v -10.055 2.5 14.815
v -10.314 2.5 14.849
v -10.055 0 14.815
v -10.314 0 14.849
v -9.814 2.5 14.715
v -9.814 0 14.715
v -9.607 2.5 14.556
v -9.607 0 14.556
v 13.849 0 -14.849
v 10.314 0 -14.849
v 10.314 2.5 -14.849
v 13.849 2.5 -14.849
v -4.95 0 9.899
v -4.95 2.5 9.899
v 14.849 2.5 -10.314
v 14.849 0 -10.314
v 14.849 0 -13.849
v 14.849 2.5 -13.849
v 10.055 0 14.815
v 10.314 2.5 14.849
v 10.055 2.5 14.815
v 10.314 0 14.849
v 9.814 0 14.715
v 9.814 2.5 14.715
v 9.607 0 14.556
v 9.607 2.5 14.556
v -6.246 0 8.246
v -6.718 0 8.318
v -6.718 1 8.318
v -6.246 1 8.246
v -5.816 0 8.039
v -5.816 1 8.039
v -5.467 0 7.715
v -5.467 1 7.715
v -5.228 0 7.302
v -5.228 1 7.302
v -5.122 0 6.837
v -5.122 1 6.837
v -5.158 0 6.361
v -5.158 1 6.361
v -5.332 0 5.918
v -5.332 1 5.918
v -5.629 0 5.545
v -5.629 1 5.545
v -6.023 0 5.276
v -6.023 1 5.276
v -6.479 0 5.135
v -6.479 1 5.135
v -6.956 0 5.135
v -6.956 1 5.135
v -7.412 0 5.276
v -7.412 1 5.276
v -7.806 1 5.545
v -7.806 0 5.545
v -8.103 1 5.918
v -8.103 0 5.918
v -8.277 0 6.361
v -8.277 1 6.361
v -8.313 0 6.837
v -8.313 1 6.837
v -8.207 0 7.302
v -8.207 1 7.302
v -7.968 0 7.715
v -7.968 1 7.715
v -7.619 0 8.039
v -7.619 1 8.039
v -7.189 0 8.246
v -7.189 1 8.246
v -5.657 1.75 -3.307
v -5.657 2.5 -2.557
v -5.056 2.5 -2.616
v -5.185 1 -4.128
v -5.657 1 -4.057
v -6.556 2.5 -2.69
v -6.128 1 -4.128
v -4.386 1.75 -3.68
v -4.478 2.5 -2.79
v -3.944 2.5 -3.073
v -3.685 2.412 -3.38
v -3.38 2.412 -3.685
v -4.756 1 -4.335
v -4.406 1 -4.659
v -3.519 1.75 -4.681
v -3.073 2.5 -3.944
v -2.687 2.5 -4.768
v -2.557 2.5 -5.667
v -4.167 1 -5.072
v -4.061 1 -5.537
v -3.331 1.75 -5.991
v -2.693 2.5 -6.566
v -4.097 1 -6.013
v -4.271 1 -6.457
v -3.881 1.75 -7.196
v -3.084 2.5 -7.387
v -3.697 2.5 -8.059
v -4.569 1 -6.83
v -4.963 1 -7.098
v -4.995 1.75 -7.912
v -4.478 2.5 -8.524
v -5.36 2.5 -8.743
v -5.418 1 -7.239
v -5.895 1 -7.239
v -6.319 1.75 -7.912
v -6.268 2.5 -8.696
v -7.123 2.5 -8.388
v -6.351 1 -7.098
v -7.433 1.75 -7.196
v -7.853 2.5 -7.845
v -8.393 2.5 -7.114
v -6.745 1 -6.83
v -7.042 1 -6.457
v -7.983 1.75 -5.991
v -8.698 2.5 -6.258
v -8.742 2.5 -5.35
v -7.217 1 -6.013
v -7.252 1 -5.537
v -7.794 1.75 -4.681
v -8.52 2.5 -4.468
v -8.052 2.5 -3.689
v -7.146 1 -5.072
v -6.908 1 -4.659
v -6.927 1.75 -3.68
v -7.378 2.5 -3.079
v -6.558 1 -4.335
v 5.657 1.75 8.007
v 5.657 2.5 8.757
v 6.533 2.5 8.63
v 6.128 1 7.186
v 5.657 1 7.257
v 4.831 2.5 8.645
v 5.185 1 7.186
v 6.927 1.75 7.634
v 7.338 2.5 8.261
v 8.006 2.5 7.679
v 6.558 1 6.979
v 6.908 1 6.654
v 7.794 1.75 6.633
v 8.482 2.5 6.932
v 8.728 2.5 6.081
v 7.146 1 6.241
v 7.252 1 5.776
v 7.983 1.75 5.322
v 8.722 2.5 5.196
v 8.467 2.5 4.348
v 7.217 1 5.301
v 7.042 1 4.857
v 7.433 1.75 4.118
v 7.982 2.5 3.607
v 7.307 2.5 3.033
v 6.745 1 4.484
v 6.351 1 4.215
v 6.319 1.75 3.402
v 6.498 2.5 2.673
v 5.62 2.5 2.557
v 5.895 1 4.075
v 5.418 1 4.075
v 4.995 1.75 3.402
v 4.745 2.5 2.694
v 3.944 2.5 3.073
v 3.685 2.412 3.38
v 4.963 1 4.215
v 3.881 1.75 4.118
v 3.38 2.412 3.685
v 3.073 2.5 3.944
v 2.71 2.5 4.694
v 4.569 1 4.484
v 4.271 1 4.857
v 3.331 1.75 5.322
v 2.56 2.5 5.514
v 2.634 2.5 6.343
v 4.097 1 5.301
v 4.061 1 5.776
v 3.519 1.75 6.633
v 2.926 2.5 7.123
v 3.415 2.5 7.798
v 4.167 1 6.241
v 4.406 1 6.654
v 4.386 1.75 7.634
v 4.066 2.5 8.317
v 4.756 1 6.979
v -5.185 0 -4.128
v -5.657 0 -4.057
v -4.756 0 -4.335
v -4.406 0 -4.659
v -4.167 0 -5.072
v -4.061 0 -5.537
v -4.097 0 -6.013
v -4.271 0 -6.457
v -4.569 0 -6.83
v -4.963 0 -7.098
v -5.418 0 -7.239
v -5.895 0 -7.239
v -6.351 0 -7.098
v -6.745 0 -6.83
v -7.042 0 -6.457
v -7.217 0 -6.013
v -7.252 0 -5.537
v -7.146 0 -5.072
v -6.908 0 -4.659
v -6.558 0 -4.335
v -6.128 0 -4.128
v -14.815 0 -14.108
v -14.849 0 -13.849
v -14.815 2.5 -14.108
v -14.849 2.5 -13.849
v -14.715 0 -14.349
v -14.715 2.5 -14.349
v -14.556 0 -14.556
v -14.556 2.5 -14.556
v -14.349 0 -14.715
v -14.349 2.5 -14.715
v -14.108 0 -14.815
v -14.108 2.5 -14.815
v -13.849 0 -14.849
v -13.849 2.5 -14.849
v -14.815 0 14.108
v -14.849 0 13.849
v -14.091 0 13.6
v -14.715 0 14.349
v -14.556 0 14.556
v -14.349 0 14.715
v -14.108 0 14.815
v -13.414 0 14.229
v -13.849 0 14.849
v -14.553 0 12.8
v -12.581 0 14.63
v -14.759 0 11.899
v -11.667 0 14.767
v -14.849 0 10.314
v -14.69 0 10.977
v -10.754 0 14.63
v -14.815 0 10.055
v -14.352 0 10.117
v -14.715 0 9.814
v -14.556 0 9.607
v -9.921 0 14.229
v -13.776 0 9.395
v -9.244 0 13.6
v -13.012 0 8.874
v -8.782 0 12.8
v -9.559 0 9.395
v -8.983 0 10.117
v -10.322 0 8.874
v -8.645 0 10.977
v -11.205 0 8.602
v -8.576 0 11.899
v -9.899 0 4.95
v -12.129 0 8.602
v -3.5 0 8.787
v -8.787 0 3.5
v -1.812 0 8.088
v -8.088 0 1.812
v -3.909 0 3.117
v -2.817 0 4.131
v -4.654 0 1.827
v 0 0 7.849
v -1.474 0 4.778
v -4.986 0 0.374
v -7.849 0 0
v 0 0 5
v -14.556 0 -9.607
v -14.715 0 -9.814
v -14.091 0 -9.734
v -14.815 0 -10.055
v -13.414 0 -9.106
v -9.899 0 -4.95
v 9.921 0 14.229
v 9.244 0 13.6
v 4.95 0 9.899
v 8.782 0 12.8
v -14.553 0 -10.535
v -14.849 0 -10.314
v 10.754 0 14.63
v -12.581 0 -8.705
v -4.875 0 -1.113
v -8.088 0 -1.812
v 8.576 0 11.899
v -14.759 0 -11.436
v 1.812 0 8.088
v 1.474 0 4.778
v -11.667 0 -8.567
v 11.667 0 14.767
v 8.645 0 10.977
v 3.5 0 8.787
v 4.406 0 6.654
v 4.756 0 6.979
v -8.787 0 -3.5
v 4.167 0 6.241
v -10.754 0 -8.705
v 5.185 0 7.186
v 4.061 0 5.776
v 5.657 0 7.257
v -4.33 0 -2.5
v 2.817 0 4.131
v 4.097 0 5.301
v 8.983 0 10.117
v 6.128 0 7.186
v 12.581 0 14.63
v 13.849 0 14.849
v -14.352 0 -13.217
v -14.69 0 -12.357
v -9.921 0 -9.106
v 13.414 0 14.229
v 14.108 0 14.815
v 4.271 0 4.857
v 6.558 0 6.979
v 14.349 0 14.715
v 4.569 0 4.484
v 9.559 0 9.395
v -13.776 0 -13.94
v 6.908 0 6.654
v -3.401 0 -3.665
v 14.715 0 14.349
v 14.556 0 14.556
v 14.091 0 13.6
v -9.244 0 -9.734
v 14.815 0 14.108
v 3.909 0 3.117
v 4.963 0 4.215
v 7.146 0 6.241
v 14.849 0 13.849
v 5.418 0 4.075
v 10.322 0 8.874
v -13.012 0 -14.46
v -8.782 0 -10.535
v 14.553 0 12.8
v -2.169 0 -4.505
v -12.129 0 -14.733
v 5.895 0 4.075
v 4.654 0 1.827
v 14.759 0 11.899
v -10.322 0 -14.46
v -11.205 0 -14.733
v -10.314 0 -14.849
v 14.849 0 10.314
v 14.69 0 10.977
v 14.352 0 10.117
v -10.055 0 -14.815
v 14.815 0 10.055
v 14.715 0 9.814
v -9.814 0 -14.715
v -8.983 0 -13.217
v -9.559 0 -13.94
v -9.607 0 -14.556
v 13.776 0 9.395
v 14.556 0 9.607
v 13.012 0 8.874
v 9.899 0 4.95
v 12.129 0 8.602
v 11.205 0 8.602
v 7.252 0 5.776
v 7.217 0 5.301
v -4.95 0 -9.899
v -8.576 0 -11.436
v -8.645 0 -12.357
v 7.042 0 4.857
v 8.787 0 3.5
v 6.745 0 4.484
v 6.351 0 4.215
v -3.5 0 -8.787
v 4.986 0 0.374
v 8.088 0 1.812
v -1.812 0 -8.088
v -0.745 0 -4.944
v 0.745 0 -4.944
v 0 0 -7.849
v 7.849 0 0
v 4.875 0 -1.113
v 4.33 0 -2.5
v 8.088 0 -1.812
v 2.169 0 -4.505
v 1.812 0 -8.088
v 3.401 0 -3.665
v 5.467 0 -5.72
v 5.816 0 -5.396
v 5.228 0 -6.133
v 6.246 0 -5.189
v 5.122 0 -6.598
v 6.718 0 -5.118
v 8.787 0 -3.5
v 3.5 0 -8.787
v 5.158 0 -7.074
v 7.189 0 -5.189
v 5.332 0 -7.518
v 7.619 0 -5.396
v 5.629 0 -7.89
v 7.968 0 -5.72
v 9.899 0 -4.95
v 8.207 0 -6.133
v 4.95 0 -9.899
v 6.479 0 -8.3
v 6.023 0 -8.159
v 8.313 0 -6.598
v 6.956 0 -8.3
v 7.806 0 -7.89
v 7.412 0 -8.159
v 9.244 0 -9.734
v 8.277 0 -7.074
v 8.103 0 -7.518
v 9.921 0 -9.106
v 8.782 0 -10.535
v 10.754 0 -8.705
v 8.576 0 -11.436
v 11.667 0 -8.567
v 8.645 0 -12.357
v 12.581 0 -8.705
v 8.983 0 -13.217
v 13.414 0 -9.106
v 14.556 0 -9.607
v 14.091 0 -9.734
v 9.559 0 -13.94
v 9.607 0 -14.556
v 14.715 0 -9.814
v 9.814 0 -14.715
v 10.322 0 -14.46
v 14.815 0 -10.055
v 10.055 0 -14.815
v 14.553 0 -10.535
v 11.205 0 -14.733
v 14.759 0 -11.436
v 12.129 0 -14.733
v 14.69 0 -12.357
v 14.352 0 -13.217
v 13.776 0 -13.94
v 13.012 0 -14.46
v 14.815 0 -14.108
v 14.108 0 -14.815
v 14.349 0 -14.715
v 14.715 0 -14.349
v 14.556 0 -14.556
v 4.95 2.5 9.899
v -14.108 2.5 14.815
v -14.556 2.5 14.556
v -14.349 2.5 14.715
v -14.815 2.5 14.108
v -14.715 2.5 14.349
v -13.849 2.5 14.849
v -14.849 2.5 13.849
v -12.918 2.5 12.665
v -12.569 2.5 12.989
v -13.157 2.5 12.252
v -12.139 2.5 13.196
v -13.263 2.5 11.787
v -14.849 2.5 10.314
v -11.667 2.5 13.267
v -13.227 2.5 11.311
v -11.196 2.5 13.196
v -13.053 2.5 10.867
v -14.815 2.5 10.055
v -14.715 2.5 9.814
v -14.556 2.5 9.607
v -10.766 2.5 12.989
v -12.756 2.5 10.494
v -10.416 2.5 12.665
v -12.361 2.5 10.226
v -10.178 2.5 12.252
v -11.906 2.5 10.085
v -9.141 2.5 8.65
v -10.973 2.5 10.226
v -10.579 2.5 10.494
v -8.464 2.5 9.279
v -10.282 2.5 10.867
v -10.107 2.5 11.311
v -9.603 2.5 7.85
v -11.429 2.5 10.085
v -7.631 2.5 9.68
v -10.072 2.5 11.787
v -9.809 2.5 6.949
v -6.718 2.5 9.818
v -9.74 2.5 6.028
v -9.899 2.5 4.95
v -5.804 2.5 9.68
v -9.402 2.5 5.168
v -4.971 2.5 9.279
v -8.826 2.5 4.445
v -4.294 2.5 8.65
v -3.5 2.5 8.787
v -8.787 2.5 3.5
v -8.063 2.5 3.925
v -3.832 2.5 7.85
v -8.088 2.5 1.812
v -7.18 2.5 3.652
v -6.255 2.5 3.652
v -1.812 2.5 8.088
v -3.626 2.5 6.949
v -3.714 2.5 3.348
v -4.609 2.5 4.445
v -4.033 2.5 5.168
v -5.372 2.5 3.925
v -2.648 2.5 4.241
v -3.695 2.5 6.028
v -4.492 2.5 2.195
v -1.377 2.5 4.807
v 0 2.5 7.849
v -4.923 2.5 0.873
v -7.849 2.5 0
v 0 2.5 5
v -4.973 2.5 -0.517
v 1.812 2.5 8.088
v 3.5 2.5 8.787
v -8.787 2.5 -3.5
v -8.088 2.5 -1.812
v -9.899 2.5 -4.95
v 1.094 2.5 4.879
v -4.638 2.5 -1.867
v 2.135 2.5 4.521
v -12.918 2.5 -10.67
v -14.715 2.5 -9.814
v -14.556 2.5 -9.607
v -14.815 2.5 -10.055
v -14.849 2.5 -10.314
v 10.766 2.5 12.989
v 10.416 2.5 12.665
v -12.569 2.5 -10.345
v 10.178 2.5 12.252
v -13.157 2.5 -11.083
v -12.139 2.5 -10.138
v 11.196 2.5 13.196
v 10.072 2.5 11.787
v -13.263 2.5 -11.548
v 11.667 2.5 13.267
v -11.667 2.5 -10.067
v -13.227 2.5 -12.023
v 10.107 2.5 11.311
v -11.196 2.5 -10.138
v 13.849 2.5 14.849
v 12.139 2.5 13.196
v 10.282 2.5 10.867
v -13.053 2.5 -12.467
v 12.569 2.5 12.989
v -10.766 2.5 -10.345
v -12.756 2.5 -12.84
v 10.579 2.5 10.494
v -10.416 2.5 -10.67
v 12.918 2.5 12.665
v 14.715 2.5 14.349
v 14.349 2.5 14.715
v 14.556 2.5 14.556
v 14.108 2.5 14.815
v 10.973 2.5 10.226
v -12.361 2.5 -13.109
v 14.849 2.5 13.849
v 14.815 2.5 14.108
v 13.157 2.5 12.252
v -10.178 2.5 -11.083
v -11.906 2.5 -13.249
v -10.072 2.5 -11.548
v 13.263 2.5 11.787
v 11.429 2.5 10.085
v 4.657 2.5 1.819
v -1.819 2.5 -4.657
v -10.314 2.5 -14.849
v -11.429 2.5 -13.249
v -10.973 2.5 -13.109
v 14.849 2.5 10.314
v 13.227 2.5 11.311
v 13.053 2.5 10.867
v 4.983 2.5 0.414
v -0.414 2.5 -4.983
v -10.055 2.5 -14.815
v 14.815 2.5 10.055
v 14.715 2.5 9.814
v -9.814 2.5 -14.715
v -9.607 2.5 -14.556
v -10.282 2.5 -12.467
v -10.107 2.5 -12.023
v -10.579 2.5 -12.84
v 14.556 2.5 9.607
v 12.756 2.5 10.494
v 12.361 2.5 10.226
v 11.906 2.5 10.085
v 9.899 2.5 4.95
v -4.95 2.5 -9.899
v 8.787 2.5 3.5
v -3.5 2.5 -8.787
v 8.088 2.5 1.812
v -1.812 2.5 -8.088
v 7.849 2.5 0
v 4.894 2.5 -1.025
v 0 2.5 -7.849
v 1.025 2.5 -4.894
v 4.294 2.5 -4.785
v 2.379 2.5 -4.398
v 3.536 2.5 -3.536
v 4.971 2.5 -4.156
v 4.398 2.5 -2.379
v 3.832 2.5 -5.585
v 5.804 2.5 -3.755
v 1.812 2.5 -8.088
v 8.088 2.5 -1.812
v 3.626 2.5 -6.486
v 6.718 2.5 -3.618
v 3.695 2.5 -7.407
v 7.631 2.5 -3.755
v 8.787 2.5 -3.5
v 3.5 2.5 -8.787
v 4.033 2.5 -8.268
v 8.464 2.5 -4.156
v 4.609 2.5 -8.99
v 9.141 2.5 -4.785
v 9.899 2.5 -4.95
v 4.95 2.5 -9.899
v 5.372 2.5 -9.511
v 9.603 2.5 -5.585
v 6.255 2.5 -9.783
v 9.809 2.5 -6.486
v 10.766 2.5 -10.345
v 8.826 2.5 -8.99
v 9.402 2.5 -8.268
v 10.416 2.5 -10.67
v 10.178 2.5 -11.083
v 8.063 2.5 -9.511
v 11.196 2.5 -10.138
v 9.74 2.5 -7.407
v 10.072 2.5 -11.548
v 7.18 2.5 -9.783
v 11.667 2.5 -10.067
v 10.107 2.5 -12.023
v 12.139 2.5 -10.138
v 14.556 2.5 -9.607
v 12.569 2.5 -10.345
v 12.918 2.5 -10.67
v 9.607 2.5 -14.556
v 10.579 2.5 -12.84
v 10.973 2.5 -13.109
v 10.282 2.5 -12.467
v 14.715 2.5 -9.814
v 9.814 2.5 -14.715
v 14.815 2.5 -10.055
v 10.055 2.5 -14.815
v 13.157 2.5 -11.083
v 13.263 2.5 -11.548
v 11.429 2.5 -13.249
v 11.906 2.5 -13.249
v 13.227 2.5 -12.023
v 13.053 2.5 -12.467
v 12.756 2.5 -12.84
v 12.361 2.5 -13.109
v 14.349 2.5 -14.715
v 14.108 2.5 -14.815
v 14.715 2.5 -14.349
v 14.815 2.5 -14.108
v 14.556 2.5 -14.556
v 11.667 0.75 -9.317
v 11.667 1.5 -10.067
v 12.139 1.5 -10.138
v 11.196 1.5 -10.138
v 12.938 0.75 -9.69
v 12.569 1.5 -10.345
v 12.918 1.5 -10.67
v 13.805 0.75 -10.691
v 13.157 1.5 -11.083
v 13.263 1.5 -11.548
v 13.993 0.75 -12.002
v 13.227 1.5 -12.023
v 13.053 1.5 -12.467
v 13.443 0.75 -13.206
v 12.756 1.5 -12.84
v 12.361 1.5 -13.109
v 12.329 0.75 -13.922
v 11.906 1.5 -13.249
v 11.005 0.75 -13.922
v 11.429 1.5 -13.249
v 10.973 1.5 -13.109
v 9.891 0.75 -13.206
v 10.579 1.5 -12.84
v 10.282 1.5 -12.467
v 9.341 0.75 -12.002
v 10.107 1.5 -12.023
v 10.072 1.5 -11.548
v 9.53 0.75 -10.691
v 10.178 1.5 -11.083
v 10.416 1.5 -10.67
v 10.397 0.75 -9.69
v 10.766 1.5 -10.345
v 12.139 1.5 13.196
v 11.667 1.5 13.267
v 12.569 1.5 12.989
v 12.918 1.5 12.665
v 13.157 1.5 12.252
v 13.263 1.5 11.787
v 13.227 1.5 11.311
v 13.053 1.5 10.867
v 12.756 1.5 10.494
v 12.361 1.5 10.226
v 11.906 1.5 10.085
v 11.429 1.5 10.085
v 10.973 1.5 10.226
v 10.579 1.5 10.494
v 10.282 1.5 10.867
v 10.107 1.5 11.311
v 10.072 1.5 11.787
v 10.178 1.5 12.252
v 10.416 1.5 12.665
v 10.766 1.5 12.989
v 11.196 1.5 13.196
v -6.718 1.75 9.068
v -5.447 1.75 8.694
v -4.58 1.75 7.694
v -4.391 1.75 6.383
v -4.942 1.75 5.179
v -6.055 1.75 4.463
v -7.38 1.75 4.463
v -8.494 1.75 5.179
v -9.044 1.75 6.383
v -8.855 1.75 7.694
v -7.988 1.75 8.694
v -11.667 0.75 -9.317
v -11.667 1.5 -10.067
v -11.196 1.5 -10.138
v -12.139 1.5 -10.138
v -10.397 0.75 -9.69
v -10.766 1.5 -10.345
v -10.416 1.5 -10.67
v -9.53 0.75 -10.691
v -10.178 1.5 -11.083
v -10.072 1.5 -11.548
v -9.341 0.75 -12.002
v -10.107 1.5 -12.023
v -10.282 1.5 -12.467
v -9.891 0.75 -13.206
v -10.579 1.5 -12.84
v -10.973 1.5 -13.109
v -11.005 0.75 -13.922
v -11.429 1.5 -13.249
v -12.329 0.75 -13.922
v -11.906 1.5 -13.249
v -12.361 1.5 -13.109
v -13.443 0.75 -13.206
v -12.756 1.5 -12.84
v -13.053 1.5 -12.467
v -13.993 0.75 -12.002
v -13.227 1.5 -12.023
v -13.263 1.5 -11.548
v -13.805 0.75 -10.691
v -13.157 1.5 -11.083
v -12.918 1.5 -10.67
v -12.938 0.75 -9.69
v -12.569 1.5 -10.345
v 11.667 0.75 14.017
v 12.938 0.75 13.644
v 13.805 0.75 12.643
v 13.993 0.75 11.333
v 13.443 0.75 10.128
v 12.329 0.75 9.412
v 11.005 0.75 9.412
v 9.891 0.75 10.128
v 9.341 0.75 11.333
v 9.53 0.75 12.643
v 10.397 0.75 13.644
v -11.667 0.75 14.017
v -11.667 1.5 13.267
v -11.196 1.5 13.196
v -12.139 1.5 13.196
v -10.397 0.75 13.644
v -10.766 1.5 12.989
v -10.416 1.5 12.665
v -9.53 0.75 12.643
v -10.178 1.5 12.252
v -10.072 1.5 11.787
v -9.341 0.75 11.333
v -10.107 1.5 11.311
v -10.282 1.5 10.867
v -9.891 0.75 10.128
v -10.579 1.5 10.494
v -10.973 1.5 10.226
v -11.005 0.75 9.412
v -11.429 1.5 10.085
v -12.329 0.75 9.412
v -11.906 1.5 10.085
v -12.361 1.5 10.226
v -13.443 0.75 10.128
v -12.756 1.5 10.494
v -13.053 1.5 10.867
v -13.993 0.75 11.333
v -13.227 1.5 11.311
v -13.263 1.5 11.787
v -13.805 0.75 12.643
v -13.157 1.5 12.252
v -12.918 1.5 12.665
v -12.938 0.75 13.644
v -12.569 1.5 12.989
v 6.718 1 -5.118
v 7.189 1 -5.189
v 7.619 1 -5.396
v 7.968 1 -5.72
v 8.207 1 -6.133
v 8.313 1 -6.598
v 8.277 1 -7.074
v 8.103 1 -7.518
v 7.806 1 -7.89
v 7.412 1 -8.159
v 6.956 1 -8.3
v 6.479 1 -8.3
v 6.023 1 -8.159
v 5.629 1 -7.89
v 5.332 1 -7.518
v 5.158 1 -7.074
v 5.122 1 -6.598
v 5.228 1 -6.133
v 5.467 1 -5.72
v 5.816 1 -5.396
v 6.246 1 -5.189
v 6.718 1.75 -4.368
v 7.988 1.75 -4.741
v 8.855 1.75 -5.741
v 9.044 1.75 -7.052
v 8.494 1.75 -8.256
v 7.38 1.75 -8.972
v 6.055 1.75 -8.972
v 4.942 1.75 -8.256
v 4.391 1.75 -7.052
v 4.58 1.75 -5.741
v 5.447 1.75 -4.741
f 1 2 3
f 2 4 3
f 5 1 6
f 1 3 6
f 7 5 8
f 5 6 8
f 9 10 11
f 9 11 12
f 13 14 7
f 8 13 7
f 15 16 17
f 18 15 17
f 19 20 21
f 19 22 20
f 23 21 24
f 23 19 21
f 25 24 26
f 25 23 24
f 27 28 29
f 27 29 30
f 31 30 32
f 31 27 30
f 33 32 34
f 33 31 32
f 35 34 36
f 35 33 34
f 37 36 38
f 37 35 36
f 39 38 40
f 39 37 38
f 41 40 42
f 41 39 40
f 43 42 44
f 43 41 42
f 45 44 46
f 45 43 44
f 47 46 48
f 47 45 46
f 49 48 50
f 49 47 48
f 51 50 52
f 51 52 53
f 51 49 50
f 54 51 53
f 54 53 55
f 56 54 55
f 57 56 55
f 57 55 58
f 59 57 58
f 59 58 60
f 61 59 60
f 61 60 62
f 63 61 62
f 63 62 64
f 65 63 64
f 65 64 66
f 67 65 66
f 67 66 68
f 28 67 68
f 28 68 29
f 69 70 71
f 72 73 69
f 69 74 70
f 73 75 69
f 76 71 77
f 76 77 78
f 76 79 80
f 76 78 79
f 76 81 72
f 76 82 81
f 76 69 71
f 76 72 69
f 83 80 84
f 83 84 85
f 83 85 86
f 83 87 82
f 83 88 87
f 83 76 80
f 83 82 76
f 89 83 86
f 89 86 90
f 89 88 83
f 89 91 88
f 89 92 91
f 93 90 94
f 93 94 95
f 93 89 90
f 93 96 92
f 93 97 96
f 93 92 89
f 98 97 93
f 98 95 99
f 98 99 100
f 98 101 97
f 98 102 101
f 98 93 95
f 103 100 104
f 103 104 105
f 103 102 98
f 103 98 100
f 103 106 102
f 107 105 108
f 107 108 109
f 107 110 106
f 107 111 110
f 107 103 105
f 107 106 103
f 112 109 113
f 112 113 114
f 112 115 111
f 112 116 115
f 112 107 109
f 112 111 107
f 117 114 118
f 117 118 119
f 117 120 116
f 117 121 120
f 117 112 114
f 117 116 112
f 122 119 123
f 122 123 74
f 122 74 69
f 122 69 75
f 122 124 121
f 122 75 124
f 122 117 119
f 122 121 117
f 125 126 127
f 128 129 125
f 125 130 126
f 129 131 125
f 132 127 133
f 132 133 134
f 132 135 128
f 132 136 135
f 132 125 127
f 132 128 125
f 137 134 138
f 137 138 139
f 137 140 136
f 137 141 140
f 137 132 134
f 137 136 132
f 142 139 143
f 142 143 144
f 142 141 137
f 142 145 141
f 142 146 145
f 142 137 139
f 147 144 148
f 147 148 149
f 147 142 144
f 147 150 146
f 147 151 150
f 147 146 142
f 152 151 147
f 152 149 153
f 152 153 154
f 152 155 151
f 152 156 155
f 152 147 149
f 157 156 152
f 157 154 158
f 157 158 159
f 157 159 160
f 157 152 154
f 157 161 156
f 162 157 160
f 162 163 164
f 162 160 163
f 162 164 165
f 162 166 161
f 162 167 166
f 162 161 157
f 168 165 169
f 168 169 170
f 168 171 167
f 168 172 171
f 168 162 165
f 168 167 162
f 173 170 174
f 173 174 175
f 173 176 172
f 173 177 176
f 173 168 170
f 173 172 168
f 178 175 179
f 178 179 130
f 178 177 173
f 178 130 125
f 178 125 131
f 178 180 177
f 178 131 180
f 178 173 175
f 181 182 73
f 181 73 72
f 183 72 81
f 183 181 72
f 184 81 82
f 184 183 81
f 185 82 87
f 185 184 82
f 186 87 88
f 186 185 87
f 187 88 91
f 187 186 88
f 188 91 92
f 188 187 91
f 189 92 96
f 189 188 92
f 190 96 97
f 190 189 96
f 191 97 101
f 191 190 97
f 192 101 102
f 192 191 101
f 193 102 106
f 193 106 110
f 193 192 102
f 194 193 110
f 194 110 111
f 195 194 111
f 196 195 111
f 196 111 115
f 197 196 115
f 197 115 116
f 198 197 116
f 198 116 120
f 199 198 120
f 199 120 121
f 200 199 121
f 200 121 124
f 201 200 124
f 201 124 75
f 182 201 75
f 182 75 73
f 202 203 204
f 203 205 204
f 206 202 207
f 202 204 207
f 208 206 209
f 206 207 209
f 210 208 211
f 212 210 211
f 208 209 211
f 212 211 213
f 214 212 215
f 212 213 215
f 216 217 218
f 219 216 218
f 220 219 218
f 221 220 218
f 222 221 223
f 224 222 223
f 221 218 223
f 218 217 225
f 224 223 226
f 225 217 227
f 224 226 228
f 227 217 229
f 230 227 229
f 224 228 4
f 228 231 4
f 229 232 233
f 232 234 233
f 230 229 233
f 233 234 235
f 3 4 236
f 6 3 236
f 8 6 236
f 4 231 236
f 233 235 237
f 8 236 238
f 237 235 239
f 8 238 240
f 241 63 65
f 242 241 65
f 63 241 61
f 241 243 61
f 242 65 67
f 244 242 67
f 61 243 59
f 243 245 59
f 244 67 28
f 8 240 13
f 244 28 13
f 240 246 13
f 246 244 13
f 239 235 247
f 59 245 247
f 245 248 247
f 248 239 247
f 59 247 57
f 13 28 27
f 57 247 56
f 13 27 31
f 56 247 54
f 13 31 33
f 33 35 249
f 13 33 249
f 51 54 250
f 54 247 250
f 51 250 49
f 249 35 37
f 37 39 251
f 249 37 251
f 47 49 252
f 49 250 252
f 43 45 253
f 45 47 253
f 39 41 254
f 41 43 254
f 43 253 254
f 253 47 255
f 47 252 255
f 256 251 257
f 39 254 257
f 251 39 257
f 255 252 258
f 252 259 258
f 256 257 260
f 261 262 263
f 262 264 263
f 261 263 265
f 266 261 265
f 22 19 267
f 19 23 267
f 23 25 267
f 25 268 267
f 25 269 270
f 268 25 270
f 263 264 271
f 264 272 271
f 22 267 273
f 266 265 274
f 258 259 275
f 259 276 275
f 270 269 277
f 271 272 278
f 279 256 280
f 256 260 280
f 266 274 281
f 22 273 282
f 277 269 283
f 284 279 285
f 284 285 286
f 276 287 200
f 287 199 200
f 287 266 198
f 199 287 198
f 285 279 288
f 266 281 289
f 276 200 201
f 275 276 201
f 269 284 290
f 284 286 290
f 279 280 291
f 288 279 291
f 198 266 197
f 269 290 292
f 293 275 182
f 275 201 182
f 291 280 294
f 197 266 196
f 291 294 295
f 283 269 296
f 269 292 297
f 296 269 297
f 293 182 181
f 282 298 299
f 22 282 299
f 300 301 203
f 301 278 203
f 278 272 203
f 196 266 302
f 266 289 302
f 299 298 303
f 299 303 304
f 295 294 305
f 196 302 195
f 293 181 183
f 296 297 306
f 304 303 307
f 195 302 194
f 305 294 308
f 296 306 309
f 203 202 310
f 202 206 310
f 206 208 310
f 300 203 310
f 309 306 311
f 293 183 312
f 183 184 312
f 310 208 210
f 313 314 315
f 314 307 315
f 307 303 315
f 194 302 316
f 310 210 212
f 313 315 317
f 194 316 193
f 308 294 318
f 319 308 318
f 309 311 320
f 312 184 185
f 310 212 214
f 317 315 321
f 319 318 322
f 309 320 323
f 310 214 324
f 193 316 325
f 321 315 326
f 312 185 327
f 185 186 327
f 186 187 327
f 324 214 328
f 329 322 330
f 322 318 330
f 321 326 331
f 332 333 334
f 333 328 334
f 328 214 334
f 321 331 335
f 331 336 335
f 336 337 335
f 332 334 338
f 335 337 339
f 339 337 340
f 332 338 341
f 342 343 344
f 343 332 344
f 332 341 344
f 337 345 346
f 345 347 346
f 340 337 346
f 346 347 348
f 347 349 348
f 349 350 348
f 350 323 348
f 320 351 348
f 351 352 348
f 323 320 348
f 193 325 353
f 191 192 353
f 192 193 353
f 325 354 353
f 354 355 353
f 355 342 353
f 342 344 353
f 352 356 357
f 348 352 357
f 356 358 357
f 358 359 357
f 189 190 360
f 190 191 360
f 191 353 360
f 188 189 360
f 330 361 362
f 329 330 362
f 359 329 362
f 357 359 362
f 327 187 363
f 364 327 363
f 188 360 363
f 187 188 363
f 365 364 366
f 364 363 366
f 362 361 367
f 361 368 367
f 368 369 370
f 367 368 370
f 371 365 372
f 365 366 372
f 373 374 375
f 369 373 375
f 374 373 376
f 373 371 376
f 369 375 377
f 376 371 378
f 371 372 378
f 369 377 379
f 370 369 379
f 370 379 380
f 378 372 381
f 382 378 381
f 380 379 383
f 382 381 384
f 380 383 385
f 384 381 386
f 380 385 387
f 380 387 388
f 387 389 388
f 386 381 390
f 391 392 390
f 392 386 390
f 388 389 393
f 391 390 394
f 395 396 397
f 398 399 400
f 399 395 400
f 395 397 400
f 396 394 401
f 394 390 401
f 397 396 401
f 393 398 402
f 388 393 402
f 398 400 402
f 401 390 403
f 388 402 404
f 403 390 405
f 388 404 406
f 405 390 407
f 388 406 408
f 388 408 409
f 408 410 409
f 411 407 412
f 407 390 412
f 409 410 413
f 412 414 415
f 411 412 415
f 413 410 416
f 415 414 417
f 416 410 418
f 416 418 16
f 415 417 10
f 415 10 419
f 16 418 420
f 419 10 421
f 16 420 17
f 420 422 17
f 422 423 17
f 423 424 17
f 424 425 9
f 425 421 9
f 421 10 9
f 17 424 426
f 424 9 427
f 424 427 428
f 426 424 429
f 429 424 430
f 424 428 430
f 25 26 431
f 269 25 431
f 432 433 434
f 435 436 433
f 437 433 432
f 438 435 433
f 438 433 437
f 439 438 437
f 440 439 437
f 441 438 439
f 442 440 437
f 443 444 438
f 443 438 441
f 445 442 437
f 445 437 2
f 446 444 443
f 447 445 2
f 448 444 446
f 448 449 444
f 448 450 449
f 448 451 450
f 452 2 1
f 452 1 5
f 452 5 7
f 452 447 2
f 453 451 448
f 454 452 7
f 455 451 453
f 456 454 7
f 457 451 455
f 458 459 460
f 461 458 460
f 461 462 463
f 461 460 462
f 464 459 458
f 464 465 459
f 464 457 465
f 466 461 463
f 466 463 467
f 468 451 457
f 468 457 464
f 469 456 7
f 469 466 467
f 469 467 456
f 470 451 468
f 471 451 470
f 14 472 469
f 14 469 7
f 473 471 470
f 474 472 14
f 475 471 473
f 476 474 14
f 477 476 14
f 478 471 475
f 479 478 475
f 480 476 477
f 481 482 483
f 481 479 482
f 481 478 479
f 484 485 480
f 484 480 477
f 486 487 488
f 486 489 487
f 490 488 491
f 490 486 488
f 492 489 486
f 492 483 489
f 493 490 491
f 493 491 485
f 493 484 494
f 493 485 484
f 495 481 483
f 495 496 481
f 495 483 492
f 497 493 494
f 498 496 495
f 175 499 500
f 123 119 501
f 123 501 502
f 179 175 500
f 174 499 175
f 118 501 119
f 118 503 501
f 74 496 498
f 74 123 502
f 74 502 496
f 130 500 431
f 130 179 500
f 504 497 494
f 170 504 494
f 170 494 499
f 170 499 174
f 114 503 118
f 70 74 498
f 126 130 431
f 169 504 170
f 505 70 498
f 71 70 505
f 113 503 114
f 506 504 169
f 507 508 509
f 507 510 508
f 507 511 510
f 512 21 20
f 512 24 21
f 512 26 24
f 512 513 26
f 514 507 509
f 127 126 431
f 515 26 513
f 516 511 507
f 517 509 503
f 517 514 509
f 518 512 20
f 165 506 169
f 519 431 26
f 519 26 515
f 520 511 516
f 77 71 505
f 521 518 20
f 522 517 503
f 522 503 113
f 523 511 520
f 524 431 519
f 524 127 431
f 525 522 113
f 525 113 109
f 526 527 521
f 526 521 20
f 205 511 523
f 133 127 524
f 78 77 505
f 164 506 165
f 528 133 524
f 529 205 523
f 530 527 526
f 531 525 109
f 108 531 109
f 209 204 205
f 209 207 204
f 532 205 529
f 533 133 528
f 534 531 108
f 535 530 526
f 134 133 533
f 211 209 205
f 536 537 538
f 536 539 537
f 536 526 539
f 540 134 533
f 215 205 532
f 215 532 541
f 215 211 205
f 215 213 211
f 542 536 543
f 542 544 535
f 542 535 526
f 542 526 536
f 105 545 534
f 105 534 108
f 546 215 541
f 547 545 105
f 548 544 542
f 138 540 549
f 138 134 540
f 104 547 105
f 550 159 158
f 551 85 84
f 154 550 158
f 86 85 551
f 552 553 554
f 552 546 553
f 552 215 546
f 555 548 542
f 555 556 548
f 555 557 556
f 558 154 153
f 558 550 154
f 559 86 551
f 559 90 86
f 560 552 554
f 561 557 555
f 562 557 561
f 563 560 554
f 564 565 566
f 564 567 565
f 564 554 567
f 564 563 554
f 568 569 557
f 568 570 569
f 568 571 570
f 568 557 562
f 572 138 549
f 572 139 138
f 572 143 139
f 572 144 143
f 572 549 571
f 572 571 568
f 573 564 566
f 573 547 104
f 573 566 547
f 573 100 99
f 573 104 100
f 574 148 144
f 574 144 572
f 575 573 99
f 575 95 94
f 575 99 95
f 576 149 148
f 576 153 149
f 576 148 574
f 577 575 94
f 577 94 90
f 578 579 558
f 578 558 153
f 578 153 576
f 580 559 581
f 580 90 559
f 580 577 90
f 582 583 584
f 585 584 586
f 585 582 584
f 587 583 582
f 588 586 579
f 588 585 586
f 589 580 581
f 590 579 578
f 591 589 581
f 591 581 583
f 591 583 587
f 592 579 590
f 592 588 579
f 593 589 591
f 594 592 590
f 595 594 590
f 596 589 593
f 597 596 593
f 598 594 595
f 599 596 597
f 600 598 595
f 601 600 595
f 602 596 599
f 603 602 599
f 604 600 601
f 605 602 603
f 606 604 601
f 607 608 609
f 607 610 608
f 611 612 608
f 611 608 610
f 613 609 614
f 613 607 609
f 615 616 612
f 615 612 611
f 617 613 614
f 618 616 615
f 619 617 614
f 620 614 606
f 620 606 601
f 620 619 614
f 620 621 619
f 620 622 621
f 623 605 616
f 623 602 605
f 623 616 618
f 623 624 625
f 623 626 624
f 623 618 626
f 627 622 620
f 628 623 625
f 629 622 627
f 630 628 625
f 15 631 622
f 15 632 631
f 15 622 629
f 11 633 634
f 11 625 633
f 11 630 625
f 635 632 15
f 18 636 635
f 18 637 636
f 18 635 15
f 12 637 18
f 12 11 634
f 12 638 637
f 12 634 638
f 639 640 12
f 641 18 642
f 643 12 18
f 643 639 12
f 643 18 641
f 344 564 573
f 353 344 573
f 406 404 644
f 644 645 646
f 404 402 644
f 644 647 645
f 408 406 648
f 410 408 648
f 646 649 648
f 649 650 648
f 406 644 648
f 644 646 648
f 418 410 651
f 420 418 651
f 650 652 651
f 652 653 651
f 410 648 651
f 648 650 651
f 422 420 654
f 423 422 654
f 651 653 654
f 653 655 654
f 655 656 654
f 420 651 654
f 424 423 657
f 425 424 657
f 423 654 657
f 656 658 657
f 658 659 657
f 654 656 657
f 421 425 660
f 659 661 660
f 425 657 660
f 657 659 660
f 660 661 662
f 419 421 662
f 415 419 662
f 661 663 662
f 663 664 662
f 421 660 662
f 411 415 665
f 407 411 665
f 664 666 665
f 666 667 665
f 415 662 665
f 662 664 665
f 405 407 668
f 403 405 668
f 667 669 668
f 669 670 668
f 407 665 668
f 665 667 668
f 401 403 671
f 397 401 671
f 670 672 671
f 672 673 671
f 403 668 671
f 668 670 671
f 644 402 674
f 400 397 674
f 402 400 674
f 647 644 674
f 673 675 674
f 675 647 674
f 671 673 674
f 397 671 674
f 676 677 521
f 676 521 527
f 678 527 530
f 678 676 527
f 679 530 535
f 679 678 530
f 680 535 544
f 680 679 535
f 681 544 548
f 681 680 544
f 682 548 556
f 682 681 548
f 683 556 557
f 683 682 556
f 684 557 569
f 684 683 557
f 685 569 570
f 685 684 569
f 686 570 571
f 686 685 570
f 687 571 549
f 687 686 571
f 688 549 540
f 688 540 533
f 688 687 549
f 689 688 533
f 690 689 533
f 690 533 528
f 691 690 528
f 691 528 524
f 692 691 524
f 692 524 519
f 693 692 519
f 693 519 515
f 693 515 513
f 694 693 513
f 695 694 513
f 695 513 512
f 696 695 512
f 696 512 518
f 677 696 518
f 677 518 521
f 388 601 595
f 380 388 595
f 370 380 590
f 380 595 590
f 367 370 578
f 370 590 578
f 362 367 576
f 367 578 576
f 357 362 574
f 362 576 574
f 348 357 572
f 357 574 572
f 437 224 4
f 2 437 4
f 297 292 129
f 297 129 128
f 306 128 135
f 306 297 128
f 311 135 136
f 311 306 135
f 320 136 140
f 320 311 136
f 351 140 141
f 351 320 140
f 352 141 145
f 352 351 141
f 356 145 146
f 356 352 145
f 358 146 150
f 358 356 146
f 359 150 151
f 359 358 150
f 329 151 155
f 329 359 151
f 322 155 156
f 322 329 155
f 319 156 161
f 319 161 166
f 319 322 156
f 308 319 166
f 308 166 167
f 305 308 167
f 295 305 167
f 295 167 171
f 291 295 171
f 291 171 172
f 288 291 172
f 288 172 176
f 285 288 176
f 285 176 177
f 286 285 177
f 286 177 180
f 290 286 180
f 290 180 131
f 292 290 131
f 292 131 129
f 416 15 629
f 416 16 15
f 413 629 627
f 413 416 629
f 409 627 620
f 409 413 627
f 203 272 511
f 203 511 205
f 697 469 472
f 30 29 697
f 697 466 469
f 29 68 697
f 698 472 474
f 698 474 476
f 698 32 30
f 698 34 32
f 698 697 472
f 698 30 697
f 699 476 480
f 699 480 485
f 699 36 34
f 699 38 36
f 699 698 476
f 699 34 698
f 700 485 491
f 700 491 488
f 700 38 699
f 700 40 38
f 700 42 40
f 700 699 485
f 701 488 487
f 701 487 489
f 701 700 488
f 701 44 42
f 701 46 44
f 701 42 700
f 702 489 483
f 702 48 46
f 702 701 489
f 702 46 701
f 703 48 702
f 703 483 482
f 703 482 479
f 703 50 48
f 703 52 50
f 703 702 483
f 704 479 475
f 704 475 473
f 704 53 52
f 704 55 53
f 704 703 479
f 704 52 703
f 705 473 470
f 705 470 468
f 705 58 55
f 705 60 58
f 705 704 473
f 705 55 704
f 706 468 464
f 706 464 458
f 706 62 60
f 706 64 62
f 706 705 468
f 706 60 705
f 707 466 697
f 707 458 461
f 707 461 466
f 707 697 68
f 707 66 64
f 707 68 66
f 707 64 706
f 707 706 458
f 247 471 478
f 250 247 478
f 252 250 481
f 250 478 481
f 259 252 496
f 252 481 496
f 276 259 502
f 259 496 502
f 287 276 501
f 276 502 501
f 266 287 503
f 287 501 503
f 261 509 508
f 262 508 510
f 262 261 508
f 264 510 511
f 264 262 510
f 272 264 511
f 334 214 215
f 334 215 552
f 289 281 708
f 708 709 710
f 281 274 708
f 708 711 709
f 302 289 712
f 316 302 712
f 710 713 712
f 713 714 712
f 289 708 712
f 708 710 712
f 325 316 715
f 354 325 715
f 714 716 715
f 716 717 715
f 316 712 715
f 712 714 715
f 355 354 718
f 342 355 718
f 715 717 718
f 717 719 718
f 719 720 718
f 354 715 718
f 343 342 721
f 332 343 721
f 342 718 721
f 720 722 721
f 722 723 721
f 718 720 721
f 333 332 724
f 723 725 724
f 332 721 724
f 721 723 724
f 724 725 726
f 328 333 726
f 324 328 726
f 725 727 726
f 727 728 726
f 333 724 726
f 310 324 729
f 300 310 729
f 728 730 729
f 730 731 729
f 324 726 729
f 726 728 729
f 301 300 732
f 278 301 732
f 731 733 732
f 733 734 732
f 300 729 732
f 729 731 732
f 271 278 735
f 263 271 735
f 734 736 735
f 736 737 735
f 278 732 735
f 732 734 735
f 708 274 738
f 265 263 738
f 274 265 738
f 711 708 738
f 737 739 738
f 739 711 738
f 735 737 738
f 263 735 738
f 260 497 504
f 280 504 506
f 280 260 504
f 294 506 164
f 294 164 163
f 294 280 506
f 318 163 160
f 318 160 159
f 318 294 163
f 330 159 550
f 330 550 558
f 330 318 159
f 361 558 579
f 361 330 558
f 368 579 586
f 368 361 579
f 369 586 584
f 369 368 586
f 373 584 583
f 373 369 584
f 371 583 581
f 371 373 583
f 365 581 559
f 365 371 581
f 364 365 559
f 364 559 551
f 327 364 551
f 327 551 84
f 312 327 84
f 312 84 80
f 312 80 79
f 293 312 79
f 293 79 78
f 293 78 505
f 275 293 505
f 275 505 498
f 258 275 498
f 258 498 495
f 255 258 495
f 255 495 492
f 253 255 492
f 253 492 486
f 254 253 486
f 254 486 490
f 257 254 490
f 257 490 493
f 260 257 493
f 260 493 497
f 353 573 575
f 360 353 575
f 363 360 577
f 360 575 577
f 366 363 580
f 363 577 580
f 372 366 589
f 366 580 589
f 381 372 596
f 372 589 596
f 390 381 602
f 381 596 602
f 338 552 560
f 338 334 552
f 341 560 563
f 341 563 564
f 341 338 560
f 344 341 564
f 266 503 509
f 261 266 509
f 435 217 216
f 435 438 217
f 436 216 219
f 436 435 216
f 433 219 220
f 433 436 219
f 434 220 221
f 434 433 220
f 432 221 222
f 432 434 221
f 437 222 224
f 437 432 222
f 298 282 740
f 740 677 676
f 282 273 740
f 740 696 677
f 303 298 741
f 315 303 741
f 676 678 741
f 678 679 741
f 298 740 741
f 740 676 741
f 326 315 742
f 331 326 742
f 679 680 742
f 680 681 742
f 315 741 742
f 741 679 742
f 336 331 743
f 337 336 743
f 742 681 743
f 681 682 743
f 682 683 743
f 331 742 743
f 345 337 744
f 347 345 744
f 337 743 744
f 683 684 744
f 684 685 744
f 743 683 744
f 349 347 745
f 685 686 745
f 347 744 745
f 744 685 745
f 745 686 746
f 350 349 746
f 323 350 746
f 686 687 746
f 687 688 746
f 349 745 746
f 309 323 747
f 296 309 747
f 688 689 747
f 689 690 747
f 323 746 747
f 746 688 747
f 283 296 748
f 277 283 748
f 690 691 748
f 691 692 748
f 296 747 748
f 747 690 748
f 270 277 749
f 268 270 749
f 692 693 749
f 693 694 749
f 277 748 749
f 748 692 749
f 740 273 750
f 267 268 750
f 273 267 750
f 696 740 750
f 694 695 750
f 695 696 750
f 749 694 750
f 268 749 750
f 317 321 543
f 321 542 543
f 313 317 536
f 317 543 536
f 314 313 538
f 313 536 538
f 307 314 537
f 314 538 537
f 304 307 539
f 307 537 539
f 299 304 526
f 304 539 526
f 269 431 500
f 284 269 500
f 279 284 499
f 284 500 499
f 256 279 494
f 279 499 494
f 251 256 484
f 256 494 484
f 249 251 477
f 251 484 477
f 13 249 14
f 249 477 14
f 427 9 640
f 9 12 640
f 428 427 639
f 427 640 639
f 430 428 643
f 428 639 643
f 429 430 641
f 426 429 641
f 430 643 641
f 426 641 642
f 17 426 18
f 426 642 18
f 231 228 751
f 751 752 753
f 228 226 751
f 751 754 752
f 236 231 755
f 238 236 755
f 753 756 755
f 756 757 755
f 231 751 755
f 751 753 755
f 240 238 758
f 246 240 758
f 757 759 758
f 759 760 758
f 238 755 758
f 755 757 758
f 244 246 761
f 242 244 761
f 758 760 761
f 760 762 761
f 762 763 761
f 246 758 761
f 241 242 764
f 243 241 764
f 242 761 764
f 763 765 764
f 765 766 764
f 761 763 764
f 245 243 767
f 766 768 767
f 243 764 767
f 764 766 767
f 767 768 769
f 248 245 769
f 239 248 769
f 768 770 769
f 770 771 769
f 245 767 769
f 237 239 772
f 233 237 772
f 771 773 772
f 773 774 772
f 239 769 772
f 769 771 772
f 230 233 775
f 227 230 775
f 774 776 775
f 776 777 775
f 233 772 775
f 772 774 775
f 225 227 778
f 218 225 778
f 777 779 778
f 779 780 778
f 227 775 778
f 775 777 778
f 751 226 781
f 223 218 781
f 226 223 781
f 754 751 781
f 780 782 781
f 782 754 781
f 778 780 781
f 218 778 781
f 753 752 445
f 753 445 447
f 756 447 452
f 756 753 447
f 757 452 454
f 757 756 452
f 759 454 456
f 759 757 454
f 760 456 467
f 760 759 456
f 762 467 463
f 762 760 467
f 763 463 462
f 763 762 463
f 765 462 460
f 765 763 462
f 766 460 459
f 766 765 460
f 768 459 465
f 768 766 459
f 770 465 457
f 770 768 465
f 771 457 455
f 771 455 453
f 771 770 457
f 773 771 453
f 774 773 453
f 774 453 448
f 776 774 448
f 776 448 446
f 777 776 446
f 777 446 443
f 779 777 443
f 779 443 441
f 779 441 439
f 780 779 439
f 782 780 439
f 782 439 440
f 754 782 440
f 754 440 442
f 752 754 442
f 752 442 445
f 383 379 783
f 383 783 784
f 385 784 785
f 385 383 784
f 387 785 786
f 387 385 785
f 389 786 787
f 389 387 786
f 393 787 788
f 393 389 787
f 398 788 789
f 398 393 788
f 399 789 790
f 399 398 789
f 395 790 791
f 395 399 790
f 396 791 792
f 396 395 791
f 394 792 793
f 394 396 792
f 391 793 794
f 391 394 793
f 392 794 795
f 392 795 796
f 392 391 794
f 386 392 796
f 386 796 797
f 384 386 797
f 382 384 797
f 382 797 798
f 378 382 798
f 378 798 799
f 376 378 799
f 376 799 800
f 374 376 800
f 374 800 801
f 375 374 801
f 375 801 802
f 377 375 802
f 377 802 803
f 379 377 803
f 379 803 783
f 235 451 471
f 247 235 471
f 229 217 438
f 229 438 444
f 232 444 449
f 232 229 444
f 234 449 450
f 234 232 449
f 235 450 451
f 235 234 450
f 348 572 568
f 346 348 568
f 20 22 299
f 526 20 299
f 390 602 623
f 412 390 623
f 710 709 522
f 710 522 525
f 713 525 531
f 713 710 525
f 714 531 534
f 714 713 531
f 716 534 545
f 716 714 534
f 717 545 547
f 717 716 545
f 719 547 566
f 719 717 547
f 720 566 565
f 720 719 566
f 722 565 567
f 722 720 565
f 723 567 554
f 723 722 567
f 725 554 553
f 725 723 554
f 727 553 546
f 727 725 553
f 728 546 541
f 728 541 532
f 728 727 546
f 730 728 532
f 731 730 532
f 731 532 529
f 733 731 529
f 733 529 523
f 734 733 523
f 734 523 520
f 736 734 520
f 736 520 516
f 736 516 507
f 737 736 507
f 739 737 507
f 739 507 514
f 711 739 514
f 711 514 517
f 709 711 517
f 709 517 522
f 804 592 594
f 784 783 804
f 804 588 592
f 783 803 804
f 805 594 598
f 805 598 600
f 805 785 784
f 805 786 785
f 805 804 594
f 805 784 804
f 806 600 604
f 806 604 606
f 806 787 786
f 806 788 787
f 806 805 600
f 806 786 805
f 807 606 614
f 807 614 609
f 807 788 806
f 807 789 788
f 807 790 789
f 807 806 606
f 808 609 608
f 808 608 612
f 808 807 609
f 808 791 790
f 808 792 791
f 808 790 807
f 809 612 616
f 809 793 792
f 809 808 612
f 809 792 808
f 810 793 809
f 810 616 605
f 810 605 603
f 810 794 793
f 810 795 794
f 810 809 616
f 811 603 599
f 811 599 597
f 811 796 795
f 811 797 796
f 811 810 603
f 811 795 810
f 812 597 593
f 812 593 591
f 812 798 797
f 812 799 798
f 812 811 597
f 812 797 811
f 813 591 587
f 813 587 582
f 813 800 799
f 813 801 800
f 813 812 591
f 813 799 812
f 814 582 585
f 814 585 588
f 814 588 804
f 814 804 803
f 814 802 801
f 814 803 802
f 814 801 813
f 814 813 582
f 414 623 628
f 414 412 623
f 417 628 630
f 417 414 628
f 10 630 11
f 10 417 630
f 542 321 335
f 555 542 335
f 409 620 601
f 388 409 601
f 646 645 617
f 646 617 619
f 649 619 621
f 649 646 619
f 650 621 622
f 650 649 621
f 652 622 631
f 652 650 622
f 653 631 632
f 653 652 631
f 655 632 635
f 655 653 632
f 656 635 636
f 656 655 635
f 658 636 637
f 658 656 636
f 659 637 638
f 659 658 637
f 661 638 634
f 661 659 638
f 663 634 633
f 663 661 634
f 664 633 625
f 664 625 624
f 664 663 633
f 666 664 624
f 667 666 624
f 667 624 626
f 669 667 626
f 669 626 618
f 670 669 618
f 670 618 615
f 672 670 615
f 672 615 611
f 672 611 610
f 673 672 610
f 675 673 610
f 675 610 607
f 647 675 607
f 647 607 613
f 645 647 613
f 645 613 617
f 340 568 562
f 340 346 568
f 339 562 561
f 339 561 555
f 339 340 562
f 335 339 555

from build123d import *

# Parameters (mm, degrees)
SKETCH1_W           = 29.69848481
SKETCH1_H           = 29.69848481
SKETCH1_R           = 5
SKETCH1_R_2         = 1.6
BOSS_EXTRUDE1_DEPTH = 2.5
CUT_EXTRUDE1_DEPTH  = 22.148285983
FILLET3_R           = 1
CHAMFER1_SIZE       = 1.5


with BuildPart() as part:
    # Sketch1 → Boss-Extrude1 (new body)
    with BuildSketch(Plane(origin=(0, 0, 0), x_dir=(1, 0, 0), z_dir=(0, 1, 0))):
        Rectangle(SKETCH1_W, SKETCH1_H)
        with Locations(Location((0, 0, 0), (0, 0, 270))):
            Circle(SKETCH1_R, mode=Mode.SUBTRACT)
        with Locations(Location((-5.656854249, 5.656854249, 0), (0, 0, 270))):
            Circle(SKETCH1_R_2, mode=Mode.SUBTRACT)
        with Locations(Location((5.656854249, -5.656854249, 0), (0, 0, 270))):
            Circle(SKETCH1_R_2, mode=Mode.SUBTRACT)
        with Locations(Location((-6.717514421, -6.717514421, 0), (0, 0, 270))):
            Circle(SKETCH1_R_2, mode=Mode.SUBTRACT)
        with Locations(Location((6.717514421, 6.717514421, 0), (0, 0, 270))):
            Circle(SKETCH1_R_2, mode=Mode.SUBTRACT)
        with Locations(Location((-11.66726189, -11.66726189, 0), (0, 0, 270))):
            Circle(SKETCH1_R_2, mode=Mode.SUBTRACT)
        with Locations(Location((-11.66726189, 11.66726189, 0), (0, 0, 270))):
            Circle(SKETCH1_R_2, mode=Mode.SUBTRACT)
        with Locations(Location((11.66726189, 11.66726189, 0), (0, 0, 270))):
            Circle(SKETCH1_R_2, mode=Mode.SUBTRACT)
        with Locations(Location((11.66726189, -11.66726189, 0), (0, 0, 270))):
            Circle(SKETCH1_R_2, mode=Mode.SUBTRACT)
    extrude(amount=BOSS_EXTRUDE1_DEPTH)

    # Sketch2 → Cut-Extrude1 (cut, through all)
    with BuildSketch(Plane(origin=(0, 2.5, 0), x_dir=(1, 0, 0), z_dir=(0, 1, 0))):
        with BuildLine():
            Line((-9.899494937, 4.949747468), (-14.849242405, 9.899494937))
            Line((-14.849242405, 9.899494937), (-14.849242405, -9.899494937))
            Line((-14.849242405, -9.899494937), (-9.899494937, -4.949747468))
            ThreePointArc((-9.899494937, -4.949747468), (-7.849242405, 0), (-9.899494937, 4.949747468))
        make_face()
        with BuildLine():
            Line((9.899494937, 14.849242405), (-9.899494937, 14.849242405))
            Line((-9.899494937, 14.849242405), (-4.949747468, 9.899494937))
            ThreePointArc((-4.949747468, 9.899494937), (0, 7.849242405), (4.949747468, 9.899494937))
            Line((4.949747468, 9.899494937), (9.899494937, 14.849242405))
        make_face()
        with BuildLine():
            Line((14.849242405, -9.899494937), (14.849242405, 9.899494937))
            Line((14.849242405, 9.899494937), (9.899494937, 4.949747468))
            ThreePointArc((9.899494937, 4.949747468), (7.849242405, 0), (9.899494937, -4.949747468))
            Line((9.899494937, -4.949747468), (14.849242405, -9.899494937))
        make_face()
        with BuildLine():
            Line((-9.899494937, -14.849242405), (9.899494937, -14.849242405))
            Line((9.899494937, -14.849242405), (4.949747468, -9.899494937))
            ThreePointArc((4.949747468, -9.899494937), (0, -7.849242405), (-4.949747468, -9.899494937))
            Line((-4.949747468, -9.899494937), (-9.899494937, -14.849242405))
        make_face()
    extrude(amount=-CUT_EXTRUDE1_DEPTH, mode=Mode.SUBTRACT)

    # Fillet3
    fillet3_edges = [part.edges().sort_by_distance(p)[0] for p in [
        (14.849242405, 1.25, -9.899494937),
        (14.849242405, 1.25, 9.899494937),
        (14.849242405, 1.25, 14.849242405),
        (-14.849242405, 1.25, 14.849242405),
        (-14.849242405, 1.25, -14.849242405),
        (-9.899494937, 1.25, -14.849242405),
        (9.899494937, 1.25, -14.849242405),
        (14.849242405, 1.25, -14.849242405),
        (9.899494937, 1.25, 14.849242405),
        (-9.899494937, 1.25, 14.849242405),
        (-14.849242405, 1.25, 9.899494937),
        (-14.849242405, 1.25, -9.899494937),
    ]]
    fillet(fillet3_edges, radius=FILLET3_R)

    # Chamfer1
    # the kernel refuses this chamfer: 1.5 mm, written as the material it takes off along each edge
    with BuildSketch(Plane(origin=(-5.656854249, 2.5, -5.656854249), x_dir=(0, 0, 1), z_dir=(-1, 0, 0))) as chamfer1_piece_1:
        Polygon((1.6 + CHAMFER1_SIZE, 0), (1.6, -CHAMFER1_SIZE), (1.6, 0), align=None)
    revolve(axis=Axis((-5.656854249, 2.5, -5.656854249), (0, 1, 0)), mode=Mode.SUBTRACT)
    with BuildSketch(Plane(origin=(5.656854249, 2.5, 5.656854249), x_dir=(0, 0, 1), z_dir=(-1, 0, 0))) as chamfer1_piece_2:
        Polygon((1.6 + CHAMFER1_SIZE, 0), (1.6, -CHAMFER1_SIZE), (1.6, 0), align=None)
    revolve(axis=Axis((5.656854249, 2.5, 5.656854249), (0, 1, 0)), mode=Mode.SUBTRACT)
    with BuildSketch(Plane(origin=(-6.717514421, 2.5, 6.717514421), x_dir=(0, 0, 1), z_dir=(-1, 0, 0))) as chamfer1_piece_3:
        Polygon((1.6 + CHAMFER1_SIZE, 0), (1.6, -CHAMFER1_SIZE), (1.6, 0), align=None)
    revolve(axis=Axis((-6.717514421, 2.5, 6.717514421), (0, 1, 0)), mode=Mode.SUBTRACT)
    with BuildSketch(Plane(origin=(6.717514421, 2.5, -6.717514421), x_dir=(0, 0, 1), z_dir=(-1, 0, 0))) as chamfer1_piece_4:
        Polygon((1.6 + CHAMFER1_SIZE, 0), (1.6, -CHAMFER1_SIZE), (1.6, 0), align=None)
    revolve(axis=Axis((6.717514421, 2.5, -6.717514421), (0, 1, 0)), mode=Mode.SUBTRACT)
    with BuildSketch(Plane(origin=(-11.66726189, 0, 11.66726189), x_dir=(0, 0, 1), z_dir=(-1, 0, 0))) as chamfer1_piece_5:
        Polygon((1.6 + CHAMFER1_SIZE, 0), (1.6, CHAMFER1_SIZE), (1.6, 0), align=None)
    revolve(axis=Axis((-11.66726189, 0, 11.66726189), (0, 1, 0)), mode=Mode.SUBTRACT)
    with BuildSketch(Plane(origin=(-11.66726189, 0, -11.66726189), x_dir=(0, 0, 1), z_dir=(-1, 0, 0))) as chamfer1_piece_6:
        Polygon((1.6 + CHAMFER1_SIZE, 0), (1.6, CHAMFER1_SIZE), (1.6, 0), align=None)
    revolve(axis=Axis((-11.66726189, 0, -11.66726189), (0, 1, 0)), mode=Mode.SUBTRACT)
    with BuildSketch(Plane(origin=(11.66726189, 0, -11.66726189), x_dir=(0, 0, 1), z_dir=(-1, 0, 0))) as chamfer1_piece_7:
        Polygon((1.6 + CHAMFER1_SIZE, 0), (1.6, CHAMFER1_SIZE), (1.6, 0), align=None)
    revolve(axis=Axis((11.66726189, 0, -11.66726189), (0, 1, 0)), mode=Mode.SUBTRACT)
    with BuildSketch(Plane(origin=(11.66726189, 0, 11.66726189), x_dir=(0, 0, 1), z_dir=(-1, 0, 0))) as chamfer1_piece_8:
        Polygon((1.6 + CHAMFER1_SIZE, 0), (1.6, CHAMFER1_SIZE), (1.6, 0), align=None)
    revolve(axis=Axis((11.66726189, 0, 11.66726189), (0, 1, 0)), mode=Mode.SUBTRACT)


solid = part.part
